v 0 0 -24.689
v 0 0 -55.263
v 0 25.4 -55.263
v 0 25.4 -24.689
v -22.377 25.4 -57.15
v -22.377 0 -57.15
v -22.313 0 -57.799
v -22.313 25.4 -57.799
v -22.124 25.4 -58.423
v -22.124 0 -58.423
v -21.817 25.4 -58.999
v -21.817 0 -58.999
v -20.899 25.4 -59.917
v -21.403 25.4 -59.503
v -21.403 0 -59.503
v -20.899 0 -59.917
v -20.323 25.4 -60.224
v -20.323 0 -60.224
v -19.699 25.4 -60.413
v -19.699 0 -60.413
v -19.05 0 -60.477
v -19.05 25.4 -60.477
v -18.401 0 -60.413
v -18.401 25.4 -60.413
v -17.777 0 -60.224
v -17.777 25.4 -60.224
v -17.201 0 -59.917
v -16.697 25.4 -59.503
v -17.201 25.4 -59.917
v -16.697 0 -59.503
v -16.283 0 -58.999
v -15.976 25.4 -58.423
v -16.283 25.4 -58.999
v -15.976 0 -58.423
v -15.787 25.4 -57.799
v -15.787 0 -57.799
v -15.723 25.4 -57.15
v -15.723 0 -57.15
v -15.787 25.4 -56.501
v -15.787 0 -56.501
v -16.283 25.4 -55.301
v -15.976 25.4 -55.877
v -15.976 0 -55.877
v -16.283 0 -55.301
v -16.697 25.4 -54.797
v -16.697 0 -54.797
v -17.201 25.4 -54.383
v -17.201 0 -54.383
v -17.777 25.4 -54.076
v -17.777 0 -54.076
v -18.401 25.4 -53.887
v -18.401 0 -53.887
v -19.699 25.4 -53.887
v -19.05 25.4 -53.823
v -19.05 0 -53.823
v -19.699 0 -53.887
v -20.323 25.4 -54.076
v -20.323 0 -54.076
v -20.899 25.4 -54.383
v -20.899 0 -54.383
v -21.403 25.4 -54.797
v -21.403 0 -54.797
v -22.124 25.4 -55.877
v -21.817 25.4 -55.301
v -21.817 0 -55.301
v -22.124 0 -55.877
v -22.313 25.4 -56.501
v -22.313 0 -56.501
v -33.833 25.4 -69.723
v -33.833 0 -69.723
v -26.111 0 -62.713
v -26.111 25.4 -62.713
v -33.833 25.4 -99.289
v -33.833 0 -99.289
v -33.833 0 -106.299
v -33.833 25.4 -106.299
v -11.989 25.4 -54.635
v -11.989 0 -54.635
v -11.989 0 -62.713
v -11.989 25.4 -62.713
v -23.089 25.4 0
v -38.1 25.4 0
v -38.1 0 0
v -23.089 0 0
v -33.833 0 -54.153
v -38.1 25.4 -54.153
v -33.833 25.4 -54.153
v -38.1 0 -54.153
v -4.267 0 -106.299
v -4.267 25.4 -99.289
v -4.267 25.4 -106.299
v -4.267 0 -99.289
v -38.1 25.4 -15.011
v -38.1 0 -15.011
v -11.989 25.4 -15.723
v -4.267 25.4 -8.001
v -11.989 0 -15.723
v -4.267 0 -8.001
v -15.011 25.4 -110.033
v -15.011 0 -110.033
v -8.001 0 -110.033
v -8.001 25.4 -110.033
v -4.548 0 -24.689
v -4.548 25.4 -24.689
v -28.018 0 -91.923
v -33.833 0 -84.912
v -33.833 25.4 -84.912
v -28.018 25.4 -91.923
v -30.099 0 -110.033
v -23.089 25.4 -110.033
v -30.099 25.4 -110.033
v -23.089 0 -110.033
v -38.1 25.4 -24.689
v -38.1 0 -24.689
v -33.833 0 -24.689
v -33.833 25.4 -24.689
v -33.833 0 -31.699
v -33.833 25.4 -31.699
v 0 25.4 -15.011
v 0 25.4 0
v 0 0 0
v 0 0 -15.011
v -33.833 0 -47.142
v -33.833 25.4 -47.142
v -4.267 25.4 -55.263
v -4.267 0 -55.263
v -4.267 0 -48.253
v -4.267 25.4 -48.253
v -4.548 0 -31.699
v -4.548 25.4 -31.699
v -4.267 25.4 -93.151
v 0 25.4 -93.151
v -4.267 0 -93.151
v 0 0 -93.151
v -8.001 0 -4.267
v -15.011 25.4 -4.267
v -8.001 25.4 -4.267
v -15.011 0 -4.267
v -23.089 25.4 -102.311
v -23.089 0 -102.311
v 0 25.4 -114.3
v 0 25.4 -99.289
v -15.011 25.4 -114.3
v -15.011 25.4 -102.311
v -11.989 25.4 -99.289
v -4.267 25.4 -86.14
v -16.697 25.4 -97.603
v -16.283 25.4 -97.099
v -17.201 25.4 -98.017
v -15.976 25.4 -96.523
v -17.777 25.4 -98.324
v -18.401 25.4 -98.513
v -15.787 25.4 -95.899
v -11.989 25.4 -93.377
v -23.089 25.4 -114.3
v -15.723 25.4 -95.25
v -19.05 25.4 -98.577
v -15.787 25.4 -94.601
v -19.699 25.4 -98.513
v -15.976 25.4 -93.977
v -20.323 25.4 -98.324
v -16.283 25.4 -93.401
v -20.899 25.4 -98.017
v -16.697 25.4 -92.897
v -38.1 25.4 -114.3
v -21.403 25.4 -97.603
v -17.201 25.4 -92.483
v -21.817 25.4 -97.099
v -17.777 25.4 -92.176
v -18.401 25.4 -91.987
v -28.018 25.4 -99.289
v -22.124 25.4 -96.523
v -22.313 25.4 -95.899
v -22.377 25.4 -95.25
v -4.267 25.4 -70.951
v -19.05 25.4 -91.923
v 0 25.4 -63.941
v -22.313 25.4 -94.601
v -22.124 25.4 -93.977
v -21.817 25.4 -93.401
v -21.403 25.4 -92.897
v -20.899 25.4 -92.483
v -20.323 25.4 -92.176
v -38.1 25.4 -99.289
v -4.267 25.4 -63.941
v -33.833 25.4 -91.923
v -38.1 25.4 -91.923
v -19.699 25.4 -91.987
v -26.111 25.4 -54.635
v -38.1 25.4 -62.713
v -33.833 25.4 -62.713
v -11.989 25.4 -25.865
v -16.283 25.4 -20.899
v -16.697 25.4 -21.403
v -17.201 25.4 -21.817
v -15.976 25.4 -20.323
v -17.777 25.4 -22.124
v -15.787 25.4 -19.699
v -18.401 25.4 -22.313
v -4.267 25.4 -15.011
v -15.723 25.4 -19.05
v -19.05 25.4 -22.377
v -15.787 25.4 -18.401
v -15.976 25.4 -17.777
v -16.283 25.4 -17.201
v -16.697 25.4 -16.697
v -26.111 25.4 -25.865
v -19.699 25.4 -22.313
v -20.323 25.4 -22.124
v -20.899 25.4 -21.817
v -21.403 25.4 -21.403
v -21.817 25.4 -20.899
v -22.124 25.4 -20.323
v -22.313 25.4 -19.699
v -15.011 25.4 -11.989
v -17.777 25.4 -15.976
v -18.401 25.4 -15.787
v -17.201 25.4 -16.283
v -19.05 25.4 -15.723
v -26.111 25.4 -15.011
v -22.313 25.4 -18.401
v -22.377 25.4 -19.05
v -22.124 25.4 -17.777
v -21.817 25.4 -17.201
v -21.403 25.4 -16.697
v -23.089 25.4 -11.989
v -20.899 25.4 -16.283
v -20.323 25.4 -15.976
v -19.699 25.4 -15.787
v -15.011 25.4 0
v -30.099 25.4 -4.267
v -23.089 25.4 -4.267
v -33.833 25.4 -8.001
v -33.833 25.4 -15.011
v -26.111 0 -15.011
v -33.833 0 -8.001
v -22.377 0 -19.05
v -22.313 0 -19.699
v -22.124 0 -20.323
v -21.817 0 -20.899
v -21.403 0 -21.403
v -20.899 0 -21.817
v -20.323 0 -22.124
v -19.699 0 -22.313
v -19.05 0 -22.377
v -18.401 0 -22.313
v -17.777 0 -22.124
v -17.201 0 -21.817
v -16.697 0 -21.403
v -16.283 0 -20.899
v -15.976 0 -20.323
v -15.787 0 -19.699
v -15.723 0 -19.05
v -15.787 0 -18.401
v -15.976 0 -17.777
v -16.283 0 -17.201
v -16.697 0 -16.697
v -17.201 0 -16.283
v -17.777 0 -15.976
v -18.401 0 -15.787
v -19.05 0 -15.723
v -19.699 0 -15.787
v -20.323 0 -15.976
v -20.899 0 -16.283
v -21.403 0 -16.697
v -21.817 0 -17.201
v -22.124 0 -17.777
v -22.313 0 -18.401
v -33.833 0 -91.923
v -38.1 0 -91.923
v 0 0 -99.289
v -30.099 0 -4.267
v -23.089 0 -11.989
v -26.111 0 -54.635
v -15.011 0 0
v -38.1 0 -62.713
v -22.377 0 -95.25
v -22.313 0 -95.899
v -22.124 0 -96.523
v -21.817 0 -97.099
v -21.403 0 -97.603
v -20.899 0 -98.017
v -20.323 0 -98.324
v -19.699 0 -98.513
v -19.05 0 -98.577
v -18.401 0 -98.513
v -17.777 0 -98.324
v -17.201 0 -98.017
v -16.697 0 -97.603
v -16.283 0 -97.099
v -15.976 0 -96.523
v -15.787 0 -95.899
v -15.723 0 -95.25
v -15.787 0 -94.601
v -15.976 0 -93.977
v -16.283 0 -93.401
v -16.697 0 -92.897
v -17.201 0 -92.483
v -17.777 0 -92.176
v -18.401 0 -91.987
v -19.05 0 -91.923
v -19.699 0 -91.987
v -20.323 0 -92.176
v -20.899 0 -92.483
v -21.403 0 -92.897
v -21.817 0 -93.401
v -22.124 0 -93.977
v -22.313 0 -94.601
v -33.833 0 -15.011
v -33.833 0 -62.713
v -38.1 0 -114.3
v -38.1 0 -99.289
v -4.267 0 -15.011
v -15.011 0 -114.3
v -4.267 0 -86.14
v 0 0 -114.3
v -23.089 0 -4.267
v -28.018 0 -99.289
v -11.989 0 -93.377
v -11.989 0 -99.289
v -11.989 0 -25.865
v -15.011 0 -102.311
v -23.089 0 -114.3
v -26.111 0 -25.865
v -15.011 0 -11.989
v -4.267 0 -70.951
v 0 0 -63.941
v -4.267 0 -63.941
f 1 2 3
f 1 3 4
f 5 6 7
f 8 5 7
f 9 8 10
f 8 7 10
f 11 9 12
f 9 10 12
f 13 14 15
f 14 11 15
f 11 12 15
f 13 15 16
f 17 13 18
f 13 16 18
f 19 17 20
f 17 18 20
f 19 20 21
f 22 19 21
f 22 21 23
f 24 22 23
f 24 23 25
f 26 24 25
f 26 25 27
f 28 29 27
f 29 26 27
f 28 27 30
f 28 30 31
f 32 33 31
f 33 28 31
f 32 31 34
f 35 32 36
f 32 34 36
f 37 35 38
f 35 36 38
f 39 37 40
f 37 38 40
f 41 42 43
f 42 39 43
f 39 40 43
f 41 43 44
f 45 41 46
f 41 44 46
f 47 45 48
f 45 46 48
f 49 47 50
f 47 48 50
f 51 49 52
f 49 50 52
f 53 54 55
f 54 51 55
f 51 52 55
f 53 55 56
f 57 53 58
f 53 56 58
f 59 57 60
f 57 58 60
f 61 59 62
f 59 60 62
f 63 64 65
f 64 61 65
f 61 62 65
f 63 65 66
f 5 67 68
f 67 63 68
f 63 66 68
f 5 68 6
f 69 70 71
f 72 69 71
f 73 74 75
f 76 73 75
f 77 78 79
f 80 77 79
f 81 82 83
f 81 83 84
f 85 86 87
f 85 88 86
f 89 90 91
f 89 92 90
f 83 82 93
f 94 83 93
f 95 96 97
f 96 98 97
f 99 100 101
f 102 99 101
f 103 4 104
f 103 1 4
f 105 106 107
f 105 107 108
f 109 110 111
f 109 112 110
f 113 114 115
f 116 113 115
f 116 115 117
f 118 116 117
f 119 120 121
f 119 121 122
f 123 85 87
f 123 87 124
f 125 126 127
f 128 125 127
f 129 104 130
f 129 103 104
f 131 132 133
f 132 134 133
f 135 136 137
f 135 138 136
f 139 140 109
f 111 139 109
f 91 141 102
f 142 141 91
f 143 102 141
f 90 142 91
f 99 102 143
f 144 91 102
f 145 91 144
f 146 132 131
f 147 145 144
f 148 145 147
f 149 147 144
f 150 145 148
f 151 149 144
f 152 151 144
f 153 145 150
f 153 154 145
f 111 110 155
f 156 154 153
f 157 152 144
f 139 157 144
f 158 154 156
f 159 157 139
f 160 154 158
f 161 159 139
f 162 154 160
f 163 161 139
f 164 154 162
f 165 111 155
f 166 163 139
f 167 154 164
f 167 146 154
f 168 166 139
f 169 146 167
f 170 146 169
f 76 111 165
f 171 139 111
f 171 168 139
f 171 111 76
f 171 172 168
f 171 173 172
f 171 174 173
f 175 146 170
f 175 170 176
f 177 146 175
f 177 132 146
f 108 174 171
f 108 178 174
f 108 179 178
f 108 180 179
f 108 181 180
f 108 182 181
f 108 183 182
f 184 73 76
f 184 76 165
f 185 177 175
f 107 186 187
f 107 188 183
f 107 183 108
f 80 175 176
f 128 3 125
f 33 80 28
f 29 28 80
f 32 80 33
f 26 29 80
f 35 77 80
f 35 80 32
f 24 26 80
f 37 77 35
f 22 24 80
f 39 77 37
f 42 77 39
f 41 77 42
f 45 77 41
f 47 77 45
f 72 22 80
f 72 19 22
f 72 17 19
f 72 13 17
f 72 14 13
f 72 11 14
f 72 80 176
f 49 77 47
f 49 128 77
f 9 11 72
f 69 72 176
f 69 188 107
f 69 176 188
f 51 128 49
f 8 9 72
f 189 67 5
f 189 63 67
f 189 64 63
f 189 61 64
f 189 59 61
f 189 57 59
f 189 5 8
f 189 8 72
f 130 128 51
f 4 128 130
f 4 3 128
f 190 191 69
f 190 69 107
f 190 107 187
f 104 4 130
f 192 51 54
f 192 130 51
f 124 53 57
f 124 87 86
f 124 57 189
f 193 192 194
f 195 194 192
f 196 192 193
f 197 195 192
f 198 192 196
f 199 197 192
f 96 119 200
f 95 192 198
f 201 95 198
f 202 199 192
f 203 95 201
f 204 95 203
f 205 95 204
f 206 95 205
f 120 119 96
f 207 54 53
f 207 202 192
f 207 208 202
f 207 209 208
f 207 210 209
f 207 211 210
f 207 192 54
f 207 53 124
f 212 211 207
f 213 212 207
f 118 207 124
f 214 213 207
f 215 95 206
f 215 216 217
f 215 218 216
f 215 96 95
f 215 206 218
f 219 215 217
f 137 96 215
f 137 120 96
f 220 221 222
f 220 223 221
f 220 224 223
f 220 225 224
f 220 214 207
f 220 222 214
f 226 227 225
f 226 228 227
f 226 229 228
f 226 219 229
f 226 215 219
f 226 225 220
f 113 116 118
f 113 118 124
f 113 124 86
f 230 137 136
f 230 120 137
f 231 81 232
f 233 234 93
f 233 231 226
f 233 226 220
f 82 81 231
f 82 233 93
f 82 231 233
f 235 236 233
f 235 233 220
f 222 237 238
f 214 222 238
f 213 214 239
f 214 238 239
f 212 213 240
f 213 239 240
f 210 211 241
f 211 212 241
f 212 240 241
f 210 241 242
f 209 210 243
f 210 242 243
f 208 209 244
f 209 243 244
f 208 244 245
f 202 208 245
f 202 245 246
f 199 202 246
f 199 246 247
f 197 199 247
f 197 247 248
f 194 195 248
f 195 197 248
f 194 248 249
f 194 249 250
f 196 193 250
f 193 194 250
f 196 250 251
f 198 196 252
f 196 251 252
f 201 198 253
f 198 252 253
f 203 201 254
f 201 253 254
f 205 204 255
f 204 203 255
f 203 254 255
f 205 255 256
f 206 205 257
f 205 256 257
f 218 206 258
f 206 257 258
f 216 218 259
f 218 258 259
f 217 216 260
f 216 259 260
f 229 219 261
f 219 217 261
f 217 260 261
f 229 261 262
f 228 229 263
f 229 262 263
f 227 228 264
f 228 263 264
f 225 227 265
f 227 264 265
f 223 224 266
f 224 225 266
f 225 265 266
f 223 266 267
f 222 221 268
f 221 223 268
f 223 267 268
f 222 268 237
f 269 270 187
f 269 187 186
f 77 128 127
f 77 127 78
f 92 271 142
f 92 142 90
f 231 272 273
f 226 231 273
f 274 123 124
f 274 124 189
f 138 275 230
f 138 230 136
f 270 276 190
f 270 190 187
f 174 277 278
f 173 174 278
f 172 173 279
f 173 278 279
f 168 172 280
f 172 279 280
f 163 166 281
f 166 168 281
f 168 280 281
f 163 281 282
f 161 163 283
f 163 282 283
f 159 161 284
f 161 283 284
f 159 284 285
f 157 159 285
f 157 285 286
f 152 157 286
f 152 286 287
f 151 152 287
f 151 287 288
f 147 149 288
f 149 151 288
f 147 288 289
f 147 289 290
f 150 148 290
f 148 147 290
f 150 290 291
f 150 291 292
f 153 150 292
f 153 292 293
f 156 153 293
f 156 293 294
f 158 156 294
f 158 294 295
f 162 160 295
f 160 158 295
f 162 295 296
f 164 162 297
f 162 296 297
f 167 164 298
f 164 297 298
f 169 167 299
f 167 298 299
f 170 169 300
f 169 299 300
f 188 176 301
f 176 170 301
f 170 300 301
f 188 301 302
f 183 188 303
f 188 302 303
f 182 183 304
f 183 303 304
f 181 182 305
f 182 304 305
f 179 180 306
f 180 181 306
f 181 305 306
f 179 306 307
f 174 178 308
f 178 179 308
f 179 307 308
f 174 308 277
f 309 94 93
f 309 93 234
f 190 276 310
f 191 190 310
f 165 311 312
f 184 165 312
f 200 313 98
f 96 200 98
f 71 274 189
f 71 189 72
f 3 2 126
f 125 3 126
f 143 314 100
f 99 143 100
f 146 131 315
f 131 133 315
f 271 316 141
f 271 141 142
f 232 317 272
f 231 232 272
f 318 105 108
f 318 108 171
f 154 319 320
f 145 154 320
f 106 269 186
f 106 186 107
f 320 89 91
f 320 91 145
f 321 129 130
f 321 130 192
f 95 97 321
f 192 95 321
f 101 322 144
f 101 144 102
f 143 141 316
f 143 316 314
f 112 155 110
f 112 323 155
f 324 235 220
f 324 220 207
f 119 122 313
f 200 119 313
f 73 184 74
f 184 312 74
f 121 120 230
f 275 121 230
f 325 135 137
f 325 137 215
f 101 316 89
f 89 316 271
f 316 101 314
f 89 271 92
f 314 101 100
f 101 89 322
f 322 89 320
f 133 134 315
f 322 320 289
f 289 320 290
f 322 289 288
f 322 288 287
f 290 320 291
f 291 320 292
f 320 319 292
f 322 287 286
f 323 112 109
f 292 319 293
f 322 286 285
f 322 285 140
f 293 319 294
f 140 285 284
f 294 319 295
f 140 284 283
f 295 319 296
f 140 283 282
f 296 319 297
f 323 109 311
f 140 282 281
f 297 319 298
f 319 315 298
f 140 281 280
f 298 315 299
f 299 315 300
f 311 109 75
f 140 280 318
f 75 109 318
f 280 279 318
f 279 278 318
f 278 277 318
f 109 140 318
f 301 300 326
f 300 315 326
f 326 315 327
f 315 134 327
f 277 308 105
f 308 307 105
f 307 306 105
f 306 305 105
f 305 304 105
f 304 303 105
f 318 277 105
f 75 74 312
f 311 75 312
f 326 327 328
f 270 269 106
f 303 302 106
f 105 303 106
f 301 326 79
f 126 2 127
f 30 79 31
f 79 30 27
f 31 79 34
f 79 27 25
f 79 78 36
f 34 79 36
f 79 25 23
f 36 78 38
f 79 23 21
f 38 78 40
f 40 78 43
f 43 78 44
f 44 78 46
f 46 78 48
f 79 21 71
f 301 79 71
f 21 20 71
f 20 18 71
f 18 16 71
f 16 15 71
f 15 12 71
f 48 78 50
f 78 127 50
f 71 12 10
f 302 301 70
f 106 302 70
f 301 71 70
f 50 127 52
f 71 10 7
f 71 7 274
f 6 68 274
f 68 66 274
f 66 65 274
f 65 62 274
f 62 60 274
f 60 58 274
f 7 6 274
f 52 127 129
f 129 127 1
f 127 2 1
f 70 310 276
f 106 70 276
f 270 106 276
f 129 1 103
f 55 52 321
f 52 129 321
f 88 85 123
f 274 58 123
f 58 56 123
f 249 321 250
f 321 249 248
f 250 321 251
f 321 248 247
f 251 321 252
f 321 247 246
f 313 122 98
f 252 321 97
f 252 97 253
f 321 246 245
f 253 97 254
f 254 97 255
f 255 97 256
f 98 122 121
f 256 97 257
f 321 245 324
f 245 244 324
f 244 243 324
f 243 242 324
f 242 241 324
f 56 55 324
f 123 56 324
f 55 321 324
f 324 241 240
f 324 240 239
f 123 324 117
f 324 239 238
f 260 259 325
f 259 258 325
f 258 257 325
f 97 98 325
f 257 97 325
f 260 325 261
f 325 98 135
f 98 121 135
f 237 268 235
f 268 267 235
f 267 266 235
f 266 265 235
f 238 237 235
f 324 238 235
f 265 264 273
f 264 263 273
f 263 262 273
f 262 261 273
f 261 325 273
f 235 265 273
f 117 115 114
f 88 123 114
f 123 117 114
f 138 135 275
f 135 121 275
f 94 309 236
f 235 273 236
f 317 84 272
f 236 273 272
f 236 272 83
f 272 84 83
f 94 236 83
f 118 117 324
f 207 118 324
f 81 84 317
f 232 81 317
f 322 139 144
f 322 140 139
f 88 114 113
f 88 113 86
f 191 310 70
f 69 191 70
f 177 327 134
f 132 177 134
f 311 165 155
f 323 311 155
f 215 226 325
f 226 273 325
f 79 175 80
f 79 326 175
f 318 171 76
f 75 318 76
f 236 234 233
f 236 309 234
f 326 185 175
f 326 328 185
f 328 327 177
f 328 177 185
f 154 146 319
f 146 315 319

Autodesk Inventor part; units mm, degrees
ref_plane "YZ Plane" through (0, 0, 0) normal (1, 0, 0) x (0, 1, 0)
ref_plane "XZ Plane" through (0, 0, 0) normal (0, 1, 0) x (-1, 0, 0)
ref_plane "XY Plane" through (0, 0, 0) normal (0, 0, 1) x (1, 0, 0)
sketch "Sketch1" plane through (0, 0, 0) normal (0, 1, 0) x (-1, 0, 0)
  circle A0 centre (19.05, -19.05) radius 3.3274
  circle A1 centre (19.05, -57.15) radius 3.3274
  circle A2 centre (19.05, -95.25) radius 3.3274
  line L0 (0, 0) -> (15.0114, 0)
  line L1 (15.0114, 0) -> (15.0114, -4.2672)
  line L2 (15.0114, -4.2672) -> (8.001, -4.2672)
  line L3 (38.1, 0) -> (23.0886, 0)
  line L4 (23.0886, 0) -> (23.0886, -4.2672)
  line L5 (23.0886, -4.2672) -> (30.099, -4.2672)
  line L6 (8.001, -4.2672) -> (15.0114, -11.9888)
  line L7 (30.099, -4.2672) -> (23.0886, -11.9888)
  line L8 (23.0886, -11.9888) -> (15.0114, -11.9888)
  line L9 (38.1, 0) -> (38.1, -15.0114)
  line L10 (38.1, -15.0114) -> (33.8328, -15.0114)
  line L11 (33.8328, -15.0114) -> (33.8328, -8.001)
  line L12 (26.1112, -15.0114) -> (26.1112, -25.8654)
  line L13 (33.8328, -8.001) -> (26.1112, -15.0114)
  line L14 (38.1, -24.6888) -> (33.8328, -24.6888)
  line L15 (33.8328, -24.6888) -> (33.8328, -31.6992)
  line L16 (33.8328, -31.6992) -> (26.1112, -25.8654)
  line L17 (38.1, -114.3) -> (38.1, -99.2886)
  line L18 (38.1, -99.2886) -> (33.8328, -99.2886)
  line L19 (33.8328, -99.2886) -> (33.8328, -106.299)
  line L20 (38.1, -114.3) -> (23.0886, -114.3)
  line L21 (23.0886, -114.3) -> (23.0886, -110.0328)
  line L22 (23.0886, -110.0328) -> (30.099, -110.0328)
  line L23 (0, -114.3) -> (15.0114, -114.3)
  line L24 (15.0114, -114.3) -> (15.0114, -110.0328)
  line L25 (15.0114, -110.0328) -> (8.001, -110.0328)
  line L26 (23.0886, -102.3112) -> (15.0114, -102.3112)
  line L27 (23.0886, -102.3112) -> (30.099, -110.0328)
  line L28 (15.0114, -102.3112) -> (8.001, -110.0328)
  line L29 (38.1, -24.6888) -> (38.1, -54.1528)
  line L30 (38.1, -54.1528) -> (33.8328, -54.1528)
  line L31 (33.8328, -54.1528) -> (33.8328, -47.1424)
  line L32 (26.1112, -54.6354) -> (26.1112, -62.7126)
  line L33 (33.8328, -47.1424) -> (26.1112, -54.6354)
  line L34 (38.1, -62.7126) -> (33.8328, -62.7126)
  line L35 (33.8328, -62.7126) -> (33.8328, -69.723)
  line L36 (33.8328, -69.723) -> (26.1112, -62.7126)
  line L37 (38.1, -91.9226) -> (33.8328, -91.9226)
  line L38 (33.8328, -91.9226) -> (33.8328, -84.9122)
  line L39 (38.1, -62.7126) -> (38.1, -91.9226)
  line L40 (28.0178, -91.9226) -> (28.0178, -99.2886)
  line L41 (28.0178, -99.2886) -> (33.8328, -106.299)
  line L42 (33.8328, -84.9122) -> (28.0178, -91.9226)
  line L43 (11.9888, -54.6354) -> (11.9888, -62.7126)
  line L44 (11.9888, -93.3774) -> (11.9888, -99.2886)
  line L45 (0, 0) -> (0, -15.0114)
  line L46 (0, -15.0114) -> (4.2672, -15.0114)
  line L47 (4.2672, -15.0114) -> (4.2672, -8.001)
  line L48 (11.9888, -15.7226) -> (11.9888, -25.8654)
  line L49 (4.2672, -8.001) -> (11.9888, -15.7226)
  line L50 (0, -114.3) -> (0, -99.2886)
  line L51 (0, -99.2886) -> (4.2672, -99.2886)
  line L52 (4.2672, -99.2886) -> (4.2672, -106.299)
  line L53 (4.2672, -106.299) -> (11.9888, -99.2886)
  line L54 (0, -63.9406) -> (0, -93.1506)
  line L55 (0, -93.1506) -> (4.2672, -93.1506)
  line L56 (4.2672, -93.1506) -> (4.2672, -86.1402)
  line L57 (4.2672, -86.1402) -> (11.9888, -93.3774)
  line L58 (0, -63.9406) -> (4.2672, -63.9406)
  line L59 (4.2672, -63.9406) -> (4.2672, -70.951)
  line L60 (4.2672, -70.951) -> (11.9888, -62.7126)
  line L61 (0, -55.2632) -> (0, -24.6888)
  line L62 (0, -24.6888) -> (4.5476, -24.6888)
  line L63 (4.5476, -24.6888) -> (4.5476, -31.6992)
  line L64 (4.5476, -31.6992) -> (11.9888, -25.8654)
  line L65 (0, -55.2632) -> (4.2672, -55.2632)
  line L66 (4.2672, -55.2632) -> (4.2672, -48.2528)
  line L67 (4.2672, -48.2528) -> (11.9888, -54.6354)
  dimension "d0" = 38.1
  dimension "d1" = 114.3
  dimension "d2" = 6.6548
  dimension "d3" = 6.6548
  dimension "d4" = 6.6548
  dimension "d11" = 15.0114
  dimension "d12" = 4.2672
  dimension "d14" = 15.0114
  dimension "d15" = 7.0104
  dimension "d19" = 15.0114
  dimension "d20" = 4.2672
  dimension "d21" = 7.0104
  dimension "d22" = 11.9888
  dimension "d23" = 4.2672
  dimension "d24" = 7.0104
  dimension "d25" = 9.6774
  dimension "d26" = 15.0114
  dimension "d27" = 7.0104
  dimension "d28" = 15.0114
  dimension "d29" = 4.2672
  dimension "d30" = 7.0104
  dimension "d31" = 15.0114
  dimension "d32" = 7.0104
  dimension "d33" = 11.9888
  dimension "d34" = 29.464
  dimension "d35" = 7.0104
  dimension "d36" = 8.0772
  dimension "d37" = 11.9888
  dimension "d38" = 7.0104
  dimension "d39" = 7.0104
  dimension "d40" = 15.0114
  dimension "d41" = 4.2672
  dimension "d42" = 7.0104
  dimension "d43" = 11.9888
  dimension "d44" = 11.9888
  dimension "d45" = 11.9888
  dimension "d46" = 15.0114
  dimension "d47" = 4.2672
  dimension "d48" = 7.0104
  dimension "d49" = 7.0104
  dimension "d50" = 4.2672
  dimension "d51" = 7.0104
  dimension "d52" = 29.21
  dimension "d53" = 29.21
  dimension "d54" = 7.0104
  dimension "d55" = 4.2672
  dimension "d56" = 7.0104
extrude "Extrusion1" add sketch "Sketch1" along normal blind 25.4
properties part number "1545rail_1inch"
